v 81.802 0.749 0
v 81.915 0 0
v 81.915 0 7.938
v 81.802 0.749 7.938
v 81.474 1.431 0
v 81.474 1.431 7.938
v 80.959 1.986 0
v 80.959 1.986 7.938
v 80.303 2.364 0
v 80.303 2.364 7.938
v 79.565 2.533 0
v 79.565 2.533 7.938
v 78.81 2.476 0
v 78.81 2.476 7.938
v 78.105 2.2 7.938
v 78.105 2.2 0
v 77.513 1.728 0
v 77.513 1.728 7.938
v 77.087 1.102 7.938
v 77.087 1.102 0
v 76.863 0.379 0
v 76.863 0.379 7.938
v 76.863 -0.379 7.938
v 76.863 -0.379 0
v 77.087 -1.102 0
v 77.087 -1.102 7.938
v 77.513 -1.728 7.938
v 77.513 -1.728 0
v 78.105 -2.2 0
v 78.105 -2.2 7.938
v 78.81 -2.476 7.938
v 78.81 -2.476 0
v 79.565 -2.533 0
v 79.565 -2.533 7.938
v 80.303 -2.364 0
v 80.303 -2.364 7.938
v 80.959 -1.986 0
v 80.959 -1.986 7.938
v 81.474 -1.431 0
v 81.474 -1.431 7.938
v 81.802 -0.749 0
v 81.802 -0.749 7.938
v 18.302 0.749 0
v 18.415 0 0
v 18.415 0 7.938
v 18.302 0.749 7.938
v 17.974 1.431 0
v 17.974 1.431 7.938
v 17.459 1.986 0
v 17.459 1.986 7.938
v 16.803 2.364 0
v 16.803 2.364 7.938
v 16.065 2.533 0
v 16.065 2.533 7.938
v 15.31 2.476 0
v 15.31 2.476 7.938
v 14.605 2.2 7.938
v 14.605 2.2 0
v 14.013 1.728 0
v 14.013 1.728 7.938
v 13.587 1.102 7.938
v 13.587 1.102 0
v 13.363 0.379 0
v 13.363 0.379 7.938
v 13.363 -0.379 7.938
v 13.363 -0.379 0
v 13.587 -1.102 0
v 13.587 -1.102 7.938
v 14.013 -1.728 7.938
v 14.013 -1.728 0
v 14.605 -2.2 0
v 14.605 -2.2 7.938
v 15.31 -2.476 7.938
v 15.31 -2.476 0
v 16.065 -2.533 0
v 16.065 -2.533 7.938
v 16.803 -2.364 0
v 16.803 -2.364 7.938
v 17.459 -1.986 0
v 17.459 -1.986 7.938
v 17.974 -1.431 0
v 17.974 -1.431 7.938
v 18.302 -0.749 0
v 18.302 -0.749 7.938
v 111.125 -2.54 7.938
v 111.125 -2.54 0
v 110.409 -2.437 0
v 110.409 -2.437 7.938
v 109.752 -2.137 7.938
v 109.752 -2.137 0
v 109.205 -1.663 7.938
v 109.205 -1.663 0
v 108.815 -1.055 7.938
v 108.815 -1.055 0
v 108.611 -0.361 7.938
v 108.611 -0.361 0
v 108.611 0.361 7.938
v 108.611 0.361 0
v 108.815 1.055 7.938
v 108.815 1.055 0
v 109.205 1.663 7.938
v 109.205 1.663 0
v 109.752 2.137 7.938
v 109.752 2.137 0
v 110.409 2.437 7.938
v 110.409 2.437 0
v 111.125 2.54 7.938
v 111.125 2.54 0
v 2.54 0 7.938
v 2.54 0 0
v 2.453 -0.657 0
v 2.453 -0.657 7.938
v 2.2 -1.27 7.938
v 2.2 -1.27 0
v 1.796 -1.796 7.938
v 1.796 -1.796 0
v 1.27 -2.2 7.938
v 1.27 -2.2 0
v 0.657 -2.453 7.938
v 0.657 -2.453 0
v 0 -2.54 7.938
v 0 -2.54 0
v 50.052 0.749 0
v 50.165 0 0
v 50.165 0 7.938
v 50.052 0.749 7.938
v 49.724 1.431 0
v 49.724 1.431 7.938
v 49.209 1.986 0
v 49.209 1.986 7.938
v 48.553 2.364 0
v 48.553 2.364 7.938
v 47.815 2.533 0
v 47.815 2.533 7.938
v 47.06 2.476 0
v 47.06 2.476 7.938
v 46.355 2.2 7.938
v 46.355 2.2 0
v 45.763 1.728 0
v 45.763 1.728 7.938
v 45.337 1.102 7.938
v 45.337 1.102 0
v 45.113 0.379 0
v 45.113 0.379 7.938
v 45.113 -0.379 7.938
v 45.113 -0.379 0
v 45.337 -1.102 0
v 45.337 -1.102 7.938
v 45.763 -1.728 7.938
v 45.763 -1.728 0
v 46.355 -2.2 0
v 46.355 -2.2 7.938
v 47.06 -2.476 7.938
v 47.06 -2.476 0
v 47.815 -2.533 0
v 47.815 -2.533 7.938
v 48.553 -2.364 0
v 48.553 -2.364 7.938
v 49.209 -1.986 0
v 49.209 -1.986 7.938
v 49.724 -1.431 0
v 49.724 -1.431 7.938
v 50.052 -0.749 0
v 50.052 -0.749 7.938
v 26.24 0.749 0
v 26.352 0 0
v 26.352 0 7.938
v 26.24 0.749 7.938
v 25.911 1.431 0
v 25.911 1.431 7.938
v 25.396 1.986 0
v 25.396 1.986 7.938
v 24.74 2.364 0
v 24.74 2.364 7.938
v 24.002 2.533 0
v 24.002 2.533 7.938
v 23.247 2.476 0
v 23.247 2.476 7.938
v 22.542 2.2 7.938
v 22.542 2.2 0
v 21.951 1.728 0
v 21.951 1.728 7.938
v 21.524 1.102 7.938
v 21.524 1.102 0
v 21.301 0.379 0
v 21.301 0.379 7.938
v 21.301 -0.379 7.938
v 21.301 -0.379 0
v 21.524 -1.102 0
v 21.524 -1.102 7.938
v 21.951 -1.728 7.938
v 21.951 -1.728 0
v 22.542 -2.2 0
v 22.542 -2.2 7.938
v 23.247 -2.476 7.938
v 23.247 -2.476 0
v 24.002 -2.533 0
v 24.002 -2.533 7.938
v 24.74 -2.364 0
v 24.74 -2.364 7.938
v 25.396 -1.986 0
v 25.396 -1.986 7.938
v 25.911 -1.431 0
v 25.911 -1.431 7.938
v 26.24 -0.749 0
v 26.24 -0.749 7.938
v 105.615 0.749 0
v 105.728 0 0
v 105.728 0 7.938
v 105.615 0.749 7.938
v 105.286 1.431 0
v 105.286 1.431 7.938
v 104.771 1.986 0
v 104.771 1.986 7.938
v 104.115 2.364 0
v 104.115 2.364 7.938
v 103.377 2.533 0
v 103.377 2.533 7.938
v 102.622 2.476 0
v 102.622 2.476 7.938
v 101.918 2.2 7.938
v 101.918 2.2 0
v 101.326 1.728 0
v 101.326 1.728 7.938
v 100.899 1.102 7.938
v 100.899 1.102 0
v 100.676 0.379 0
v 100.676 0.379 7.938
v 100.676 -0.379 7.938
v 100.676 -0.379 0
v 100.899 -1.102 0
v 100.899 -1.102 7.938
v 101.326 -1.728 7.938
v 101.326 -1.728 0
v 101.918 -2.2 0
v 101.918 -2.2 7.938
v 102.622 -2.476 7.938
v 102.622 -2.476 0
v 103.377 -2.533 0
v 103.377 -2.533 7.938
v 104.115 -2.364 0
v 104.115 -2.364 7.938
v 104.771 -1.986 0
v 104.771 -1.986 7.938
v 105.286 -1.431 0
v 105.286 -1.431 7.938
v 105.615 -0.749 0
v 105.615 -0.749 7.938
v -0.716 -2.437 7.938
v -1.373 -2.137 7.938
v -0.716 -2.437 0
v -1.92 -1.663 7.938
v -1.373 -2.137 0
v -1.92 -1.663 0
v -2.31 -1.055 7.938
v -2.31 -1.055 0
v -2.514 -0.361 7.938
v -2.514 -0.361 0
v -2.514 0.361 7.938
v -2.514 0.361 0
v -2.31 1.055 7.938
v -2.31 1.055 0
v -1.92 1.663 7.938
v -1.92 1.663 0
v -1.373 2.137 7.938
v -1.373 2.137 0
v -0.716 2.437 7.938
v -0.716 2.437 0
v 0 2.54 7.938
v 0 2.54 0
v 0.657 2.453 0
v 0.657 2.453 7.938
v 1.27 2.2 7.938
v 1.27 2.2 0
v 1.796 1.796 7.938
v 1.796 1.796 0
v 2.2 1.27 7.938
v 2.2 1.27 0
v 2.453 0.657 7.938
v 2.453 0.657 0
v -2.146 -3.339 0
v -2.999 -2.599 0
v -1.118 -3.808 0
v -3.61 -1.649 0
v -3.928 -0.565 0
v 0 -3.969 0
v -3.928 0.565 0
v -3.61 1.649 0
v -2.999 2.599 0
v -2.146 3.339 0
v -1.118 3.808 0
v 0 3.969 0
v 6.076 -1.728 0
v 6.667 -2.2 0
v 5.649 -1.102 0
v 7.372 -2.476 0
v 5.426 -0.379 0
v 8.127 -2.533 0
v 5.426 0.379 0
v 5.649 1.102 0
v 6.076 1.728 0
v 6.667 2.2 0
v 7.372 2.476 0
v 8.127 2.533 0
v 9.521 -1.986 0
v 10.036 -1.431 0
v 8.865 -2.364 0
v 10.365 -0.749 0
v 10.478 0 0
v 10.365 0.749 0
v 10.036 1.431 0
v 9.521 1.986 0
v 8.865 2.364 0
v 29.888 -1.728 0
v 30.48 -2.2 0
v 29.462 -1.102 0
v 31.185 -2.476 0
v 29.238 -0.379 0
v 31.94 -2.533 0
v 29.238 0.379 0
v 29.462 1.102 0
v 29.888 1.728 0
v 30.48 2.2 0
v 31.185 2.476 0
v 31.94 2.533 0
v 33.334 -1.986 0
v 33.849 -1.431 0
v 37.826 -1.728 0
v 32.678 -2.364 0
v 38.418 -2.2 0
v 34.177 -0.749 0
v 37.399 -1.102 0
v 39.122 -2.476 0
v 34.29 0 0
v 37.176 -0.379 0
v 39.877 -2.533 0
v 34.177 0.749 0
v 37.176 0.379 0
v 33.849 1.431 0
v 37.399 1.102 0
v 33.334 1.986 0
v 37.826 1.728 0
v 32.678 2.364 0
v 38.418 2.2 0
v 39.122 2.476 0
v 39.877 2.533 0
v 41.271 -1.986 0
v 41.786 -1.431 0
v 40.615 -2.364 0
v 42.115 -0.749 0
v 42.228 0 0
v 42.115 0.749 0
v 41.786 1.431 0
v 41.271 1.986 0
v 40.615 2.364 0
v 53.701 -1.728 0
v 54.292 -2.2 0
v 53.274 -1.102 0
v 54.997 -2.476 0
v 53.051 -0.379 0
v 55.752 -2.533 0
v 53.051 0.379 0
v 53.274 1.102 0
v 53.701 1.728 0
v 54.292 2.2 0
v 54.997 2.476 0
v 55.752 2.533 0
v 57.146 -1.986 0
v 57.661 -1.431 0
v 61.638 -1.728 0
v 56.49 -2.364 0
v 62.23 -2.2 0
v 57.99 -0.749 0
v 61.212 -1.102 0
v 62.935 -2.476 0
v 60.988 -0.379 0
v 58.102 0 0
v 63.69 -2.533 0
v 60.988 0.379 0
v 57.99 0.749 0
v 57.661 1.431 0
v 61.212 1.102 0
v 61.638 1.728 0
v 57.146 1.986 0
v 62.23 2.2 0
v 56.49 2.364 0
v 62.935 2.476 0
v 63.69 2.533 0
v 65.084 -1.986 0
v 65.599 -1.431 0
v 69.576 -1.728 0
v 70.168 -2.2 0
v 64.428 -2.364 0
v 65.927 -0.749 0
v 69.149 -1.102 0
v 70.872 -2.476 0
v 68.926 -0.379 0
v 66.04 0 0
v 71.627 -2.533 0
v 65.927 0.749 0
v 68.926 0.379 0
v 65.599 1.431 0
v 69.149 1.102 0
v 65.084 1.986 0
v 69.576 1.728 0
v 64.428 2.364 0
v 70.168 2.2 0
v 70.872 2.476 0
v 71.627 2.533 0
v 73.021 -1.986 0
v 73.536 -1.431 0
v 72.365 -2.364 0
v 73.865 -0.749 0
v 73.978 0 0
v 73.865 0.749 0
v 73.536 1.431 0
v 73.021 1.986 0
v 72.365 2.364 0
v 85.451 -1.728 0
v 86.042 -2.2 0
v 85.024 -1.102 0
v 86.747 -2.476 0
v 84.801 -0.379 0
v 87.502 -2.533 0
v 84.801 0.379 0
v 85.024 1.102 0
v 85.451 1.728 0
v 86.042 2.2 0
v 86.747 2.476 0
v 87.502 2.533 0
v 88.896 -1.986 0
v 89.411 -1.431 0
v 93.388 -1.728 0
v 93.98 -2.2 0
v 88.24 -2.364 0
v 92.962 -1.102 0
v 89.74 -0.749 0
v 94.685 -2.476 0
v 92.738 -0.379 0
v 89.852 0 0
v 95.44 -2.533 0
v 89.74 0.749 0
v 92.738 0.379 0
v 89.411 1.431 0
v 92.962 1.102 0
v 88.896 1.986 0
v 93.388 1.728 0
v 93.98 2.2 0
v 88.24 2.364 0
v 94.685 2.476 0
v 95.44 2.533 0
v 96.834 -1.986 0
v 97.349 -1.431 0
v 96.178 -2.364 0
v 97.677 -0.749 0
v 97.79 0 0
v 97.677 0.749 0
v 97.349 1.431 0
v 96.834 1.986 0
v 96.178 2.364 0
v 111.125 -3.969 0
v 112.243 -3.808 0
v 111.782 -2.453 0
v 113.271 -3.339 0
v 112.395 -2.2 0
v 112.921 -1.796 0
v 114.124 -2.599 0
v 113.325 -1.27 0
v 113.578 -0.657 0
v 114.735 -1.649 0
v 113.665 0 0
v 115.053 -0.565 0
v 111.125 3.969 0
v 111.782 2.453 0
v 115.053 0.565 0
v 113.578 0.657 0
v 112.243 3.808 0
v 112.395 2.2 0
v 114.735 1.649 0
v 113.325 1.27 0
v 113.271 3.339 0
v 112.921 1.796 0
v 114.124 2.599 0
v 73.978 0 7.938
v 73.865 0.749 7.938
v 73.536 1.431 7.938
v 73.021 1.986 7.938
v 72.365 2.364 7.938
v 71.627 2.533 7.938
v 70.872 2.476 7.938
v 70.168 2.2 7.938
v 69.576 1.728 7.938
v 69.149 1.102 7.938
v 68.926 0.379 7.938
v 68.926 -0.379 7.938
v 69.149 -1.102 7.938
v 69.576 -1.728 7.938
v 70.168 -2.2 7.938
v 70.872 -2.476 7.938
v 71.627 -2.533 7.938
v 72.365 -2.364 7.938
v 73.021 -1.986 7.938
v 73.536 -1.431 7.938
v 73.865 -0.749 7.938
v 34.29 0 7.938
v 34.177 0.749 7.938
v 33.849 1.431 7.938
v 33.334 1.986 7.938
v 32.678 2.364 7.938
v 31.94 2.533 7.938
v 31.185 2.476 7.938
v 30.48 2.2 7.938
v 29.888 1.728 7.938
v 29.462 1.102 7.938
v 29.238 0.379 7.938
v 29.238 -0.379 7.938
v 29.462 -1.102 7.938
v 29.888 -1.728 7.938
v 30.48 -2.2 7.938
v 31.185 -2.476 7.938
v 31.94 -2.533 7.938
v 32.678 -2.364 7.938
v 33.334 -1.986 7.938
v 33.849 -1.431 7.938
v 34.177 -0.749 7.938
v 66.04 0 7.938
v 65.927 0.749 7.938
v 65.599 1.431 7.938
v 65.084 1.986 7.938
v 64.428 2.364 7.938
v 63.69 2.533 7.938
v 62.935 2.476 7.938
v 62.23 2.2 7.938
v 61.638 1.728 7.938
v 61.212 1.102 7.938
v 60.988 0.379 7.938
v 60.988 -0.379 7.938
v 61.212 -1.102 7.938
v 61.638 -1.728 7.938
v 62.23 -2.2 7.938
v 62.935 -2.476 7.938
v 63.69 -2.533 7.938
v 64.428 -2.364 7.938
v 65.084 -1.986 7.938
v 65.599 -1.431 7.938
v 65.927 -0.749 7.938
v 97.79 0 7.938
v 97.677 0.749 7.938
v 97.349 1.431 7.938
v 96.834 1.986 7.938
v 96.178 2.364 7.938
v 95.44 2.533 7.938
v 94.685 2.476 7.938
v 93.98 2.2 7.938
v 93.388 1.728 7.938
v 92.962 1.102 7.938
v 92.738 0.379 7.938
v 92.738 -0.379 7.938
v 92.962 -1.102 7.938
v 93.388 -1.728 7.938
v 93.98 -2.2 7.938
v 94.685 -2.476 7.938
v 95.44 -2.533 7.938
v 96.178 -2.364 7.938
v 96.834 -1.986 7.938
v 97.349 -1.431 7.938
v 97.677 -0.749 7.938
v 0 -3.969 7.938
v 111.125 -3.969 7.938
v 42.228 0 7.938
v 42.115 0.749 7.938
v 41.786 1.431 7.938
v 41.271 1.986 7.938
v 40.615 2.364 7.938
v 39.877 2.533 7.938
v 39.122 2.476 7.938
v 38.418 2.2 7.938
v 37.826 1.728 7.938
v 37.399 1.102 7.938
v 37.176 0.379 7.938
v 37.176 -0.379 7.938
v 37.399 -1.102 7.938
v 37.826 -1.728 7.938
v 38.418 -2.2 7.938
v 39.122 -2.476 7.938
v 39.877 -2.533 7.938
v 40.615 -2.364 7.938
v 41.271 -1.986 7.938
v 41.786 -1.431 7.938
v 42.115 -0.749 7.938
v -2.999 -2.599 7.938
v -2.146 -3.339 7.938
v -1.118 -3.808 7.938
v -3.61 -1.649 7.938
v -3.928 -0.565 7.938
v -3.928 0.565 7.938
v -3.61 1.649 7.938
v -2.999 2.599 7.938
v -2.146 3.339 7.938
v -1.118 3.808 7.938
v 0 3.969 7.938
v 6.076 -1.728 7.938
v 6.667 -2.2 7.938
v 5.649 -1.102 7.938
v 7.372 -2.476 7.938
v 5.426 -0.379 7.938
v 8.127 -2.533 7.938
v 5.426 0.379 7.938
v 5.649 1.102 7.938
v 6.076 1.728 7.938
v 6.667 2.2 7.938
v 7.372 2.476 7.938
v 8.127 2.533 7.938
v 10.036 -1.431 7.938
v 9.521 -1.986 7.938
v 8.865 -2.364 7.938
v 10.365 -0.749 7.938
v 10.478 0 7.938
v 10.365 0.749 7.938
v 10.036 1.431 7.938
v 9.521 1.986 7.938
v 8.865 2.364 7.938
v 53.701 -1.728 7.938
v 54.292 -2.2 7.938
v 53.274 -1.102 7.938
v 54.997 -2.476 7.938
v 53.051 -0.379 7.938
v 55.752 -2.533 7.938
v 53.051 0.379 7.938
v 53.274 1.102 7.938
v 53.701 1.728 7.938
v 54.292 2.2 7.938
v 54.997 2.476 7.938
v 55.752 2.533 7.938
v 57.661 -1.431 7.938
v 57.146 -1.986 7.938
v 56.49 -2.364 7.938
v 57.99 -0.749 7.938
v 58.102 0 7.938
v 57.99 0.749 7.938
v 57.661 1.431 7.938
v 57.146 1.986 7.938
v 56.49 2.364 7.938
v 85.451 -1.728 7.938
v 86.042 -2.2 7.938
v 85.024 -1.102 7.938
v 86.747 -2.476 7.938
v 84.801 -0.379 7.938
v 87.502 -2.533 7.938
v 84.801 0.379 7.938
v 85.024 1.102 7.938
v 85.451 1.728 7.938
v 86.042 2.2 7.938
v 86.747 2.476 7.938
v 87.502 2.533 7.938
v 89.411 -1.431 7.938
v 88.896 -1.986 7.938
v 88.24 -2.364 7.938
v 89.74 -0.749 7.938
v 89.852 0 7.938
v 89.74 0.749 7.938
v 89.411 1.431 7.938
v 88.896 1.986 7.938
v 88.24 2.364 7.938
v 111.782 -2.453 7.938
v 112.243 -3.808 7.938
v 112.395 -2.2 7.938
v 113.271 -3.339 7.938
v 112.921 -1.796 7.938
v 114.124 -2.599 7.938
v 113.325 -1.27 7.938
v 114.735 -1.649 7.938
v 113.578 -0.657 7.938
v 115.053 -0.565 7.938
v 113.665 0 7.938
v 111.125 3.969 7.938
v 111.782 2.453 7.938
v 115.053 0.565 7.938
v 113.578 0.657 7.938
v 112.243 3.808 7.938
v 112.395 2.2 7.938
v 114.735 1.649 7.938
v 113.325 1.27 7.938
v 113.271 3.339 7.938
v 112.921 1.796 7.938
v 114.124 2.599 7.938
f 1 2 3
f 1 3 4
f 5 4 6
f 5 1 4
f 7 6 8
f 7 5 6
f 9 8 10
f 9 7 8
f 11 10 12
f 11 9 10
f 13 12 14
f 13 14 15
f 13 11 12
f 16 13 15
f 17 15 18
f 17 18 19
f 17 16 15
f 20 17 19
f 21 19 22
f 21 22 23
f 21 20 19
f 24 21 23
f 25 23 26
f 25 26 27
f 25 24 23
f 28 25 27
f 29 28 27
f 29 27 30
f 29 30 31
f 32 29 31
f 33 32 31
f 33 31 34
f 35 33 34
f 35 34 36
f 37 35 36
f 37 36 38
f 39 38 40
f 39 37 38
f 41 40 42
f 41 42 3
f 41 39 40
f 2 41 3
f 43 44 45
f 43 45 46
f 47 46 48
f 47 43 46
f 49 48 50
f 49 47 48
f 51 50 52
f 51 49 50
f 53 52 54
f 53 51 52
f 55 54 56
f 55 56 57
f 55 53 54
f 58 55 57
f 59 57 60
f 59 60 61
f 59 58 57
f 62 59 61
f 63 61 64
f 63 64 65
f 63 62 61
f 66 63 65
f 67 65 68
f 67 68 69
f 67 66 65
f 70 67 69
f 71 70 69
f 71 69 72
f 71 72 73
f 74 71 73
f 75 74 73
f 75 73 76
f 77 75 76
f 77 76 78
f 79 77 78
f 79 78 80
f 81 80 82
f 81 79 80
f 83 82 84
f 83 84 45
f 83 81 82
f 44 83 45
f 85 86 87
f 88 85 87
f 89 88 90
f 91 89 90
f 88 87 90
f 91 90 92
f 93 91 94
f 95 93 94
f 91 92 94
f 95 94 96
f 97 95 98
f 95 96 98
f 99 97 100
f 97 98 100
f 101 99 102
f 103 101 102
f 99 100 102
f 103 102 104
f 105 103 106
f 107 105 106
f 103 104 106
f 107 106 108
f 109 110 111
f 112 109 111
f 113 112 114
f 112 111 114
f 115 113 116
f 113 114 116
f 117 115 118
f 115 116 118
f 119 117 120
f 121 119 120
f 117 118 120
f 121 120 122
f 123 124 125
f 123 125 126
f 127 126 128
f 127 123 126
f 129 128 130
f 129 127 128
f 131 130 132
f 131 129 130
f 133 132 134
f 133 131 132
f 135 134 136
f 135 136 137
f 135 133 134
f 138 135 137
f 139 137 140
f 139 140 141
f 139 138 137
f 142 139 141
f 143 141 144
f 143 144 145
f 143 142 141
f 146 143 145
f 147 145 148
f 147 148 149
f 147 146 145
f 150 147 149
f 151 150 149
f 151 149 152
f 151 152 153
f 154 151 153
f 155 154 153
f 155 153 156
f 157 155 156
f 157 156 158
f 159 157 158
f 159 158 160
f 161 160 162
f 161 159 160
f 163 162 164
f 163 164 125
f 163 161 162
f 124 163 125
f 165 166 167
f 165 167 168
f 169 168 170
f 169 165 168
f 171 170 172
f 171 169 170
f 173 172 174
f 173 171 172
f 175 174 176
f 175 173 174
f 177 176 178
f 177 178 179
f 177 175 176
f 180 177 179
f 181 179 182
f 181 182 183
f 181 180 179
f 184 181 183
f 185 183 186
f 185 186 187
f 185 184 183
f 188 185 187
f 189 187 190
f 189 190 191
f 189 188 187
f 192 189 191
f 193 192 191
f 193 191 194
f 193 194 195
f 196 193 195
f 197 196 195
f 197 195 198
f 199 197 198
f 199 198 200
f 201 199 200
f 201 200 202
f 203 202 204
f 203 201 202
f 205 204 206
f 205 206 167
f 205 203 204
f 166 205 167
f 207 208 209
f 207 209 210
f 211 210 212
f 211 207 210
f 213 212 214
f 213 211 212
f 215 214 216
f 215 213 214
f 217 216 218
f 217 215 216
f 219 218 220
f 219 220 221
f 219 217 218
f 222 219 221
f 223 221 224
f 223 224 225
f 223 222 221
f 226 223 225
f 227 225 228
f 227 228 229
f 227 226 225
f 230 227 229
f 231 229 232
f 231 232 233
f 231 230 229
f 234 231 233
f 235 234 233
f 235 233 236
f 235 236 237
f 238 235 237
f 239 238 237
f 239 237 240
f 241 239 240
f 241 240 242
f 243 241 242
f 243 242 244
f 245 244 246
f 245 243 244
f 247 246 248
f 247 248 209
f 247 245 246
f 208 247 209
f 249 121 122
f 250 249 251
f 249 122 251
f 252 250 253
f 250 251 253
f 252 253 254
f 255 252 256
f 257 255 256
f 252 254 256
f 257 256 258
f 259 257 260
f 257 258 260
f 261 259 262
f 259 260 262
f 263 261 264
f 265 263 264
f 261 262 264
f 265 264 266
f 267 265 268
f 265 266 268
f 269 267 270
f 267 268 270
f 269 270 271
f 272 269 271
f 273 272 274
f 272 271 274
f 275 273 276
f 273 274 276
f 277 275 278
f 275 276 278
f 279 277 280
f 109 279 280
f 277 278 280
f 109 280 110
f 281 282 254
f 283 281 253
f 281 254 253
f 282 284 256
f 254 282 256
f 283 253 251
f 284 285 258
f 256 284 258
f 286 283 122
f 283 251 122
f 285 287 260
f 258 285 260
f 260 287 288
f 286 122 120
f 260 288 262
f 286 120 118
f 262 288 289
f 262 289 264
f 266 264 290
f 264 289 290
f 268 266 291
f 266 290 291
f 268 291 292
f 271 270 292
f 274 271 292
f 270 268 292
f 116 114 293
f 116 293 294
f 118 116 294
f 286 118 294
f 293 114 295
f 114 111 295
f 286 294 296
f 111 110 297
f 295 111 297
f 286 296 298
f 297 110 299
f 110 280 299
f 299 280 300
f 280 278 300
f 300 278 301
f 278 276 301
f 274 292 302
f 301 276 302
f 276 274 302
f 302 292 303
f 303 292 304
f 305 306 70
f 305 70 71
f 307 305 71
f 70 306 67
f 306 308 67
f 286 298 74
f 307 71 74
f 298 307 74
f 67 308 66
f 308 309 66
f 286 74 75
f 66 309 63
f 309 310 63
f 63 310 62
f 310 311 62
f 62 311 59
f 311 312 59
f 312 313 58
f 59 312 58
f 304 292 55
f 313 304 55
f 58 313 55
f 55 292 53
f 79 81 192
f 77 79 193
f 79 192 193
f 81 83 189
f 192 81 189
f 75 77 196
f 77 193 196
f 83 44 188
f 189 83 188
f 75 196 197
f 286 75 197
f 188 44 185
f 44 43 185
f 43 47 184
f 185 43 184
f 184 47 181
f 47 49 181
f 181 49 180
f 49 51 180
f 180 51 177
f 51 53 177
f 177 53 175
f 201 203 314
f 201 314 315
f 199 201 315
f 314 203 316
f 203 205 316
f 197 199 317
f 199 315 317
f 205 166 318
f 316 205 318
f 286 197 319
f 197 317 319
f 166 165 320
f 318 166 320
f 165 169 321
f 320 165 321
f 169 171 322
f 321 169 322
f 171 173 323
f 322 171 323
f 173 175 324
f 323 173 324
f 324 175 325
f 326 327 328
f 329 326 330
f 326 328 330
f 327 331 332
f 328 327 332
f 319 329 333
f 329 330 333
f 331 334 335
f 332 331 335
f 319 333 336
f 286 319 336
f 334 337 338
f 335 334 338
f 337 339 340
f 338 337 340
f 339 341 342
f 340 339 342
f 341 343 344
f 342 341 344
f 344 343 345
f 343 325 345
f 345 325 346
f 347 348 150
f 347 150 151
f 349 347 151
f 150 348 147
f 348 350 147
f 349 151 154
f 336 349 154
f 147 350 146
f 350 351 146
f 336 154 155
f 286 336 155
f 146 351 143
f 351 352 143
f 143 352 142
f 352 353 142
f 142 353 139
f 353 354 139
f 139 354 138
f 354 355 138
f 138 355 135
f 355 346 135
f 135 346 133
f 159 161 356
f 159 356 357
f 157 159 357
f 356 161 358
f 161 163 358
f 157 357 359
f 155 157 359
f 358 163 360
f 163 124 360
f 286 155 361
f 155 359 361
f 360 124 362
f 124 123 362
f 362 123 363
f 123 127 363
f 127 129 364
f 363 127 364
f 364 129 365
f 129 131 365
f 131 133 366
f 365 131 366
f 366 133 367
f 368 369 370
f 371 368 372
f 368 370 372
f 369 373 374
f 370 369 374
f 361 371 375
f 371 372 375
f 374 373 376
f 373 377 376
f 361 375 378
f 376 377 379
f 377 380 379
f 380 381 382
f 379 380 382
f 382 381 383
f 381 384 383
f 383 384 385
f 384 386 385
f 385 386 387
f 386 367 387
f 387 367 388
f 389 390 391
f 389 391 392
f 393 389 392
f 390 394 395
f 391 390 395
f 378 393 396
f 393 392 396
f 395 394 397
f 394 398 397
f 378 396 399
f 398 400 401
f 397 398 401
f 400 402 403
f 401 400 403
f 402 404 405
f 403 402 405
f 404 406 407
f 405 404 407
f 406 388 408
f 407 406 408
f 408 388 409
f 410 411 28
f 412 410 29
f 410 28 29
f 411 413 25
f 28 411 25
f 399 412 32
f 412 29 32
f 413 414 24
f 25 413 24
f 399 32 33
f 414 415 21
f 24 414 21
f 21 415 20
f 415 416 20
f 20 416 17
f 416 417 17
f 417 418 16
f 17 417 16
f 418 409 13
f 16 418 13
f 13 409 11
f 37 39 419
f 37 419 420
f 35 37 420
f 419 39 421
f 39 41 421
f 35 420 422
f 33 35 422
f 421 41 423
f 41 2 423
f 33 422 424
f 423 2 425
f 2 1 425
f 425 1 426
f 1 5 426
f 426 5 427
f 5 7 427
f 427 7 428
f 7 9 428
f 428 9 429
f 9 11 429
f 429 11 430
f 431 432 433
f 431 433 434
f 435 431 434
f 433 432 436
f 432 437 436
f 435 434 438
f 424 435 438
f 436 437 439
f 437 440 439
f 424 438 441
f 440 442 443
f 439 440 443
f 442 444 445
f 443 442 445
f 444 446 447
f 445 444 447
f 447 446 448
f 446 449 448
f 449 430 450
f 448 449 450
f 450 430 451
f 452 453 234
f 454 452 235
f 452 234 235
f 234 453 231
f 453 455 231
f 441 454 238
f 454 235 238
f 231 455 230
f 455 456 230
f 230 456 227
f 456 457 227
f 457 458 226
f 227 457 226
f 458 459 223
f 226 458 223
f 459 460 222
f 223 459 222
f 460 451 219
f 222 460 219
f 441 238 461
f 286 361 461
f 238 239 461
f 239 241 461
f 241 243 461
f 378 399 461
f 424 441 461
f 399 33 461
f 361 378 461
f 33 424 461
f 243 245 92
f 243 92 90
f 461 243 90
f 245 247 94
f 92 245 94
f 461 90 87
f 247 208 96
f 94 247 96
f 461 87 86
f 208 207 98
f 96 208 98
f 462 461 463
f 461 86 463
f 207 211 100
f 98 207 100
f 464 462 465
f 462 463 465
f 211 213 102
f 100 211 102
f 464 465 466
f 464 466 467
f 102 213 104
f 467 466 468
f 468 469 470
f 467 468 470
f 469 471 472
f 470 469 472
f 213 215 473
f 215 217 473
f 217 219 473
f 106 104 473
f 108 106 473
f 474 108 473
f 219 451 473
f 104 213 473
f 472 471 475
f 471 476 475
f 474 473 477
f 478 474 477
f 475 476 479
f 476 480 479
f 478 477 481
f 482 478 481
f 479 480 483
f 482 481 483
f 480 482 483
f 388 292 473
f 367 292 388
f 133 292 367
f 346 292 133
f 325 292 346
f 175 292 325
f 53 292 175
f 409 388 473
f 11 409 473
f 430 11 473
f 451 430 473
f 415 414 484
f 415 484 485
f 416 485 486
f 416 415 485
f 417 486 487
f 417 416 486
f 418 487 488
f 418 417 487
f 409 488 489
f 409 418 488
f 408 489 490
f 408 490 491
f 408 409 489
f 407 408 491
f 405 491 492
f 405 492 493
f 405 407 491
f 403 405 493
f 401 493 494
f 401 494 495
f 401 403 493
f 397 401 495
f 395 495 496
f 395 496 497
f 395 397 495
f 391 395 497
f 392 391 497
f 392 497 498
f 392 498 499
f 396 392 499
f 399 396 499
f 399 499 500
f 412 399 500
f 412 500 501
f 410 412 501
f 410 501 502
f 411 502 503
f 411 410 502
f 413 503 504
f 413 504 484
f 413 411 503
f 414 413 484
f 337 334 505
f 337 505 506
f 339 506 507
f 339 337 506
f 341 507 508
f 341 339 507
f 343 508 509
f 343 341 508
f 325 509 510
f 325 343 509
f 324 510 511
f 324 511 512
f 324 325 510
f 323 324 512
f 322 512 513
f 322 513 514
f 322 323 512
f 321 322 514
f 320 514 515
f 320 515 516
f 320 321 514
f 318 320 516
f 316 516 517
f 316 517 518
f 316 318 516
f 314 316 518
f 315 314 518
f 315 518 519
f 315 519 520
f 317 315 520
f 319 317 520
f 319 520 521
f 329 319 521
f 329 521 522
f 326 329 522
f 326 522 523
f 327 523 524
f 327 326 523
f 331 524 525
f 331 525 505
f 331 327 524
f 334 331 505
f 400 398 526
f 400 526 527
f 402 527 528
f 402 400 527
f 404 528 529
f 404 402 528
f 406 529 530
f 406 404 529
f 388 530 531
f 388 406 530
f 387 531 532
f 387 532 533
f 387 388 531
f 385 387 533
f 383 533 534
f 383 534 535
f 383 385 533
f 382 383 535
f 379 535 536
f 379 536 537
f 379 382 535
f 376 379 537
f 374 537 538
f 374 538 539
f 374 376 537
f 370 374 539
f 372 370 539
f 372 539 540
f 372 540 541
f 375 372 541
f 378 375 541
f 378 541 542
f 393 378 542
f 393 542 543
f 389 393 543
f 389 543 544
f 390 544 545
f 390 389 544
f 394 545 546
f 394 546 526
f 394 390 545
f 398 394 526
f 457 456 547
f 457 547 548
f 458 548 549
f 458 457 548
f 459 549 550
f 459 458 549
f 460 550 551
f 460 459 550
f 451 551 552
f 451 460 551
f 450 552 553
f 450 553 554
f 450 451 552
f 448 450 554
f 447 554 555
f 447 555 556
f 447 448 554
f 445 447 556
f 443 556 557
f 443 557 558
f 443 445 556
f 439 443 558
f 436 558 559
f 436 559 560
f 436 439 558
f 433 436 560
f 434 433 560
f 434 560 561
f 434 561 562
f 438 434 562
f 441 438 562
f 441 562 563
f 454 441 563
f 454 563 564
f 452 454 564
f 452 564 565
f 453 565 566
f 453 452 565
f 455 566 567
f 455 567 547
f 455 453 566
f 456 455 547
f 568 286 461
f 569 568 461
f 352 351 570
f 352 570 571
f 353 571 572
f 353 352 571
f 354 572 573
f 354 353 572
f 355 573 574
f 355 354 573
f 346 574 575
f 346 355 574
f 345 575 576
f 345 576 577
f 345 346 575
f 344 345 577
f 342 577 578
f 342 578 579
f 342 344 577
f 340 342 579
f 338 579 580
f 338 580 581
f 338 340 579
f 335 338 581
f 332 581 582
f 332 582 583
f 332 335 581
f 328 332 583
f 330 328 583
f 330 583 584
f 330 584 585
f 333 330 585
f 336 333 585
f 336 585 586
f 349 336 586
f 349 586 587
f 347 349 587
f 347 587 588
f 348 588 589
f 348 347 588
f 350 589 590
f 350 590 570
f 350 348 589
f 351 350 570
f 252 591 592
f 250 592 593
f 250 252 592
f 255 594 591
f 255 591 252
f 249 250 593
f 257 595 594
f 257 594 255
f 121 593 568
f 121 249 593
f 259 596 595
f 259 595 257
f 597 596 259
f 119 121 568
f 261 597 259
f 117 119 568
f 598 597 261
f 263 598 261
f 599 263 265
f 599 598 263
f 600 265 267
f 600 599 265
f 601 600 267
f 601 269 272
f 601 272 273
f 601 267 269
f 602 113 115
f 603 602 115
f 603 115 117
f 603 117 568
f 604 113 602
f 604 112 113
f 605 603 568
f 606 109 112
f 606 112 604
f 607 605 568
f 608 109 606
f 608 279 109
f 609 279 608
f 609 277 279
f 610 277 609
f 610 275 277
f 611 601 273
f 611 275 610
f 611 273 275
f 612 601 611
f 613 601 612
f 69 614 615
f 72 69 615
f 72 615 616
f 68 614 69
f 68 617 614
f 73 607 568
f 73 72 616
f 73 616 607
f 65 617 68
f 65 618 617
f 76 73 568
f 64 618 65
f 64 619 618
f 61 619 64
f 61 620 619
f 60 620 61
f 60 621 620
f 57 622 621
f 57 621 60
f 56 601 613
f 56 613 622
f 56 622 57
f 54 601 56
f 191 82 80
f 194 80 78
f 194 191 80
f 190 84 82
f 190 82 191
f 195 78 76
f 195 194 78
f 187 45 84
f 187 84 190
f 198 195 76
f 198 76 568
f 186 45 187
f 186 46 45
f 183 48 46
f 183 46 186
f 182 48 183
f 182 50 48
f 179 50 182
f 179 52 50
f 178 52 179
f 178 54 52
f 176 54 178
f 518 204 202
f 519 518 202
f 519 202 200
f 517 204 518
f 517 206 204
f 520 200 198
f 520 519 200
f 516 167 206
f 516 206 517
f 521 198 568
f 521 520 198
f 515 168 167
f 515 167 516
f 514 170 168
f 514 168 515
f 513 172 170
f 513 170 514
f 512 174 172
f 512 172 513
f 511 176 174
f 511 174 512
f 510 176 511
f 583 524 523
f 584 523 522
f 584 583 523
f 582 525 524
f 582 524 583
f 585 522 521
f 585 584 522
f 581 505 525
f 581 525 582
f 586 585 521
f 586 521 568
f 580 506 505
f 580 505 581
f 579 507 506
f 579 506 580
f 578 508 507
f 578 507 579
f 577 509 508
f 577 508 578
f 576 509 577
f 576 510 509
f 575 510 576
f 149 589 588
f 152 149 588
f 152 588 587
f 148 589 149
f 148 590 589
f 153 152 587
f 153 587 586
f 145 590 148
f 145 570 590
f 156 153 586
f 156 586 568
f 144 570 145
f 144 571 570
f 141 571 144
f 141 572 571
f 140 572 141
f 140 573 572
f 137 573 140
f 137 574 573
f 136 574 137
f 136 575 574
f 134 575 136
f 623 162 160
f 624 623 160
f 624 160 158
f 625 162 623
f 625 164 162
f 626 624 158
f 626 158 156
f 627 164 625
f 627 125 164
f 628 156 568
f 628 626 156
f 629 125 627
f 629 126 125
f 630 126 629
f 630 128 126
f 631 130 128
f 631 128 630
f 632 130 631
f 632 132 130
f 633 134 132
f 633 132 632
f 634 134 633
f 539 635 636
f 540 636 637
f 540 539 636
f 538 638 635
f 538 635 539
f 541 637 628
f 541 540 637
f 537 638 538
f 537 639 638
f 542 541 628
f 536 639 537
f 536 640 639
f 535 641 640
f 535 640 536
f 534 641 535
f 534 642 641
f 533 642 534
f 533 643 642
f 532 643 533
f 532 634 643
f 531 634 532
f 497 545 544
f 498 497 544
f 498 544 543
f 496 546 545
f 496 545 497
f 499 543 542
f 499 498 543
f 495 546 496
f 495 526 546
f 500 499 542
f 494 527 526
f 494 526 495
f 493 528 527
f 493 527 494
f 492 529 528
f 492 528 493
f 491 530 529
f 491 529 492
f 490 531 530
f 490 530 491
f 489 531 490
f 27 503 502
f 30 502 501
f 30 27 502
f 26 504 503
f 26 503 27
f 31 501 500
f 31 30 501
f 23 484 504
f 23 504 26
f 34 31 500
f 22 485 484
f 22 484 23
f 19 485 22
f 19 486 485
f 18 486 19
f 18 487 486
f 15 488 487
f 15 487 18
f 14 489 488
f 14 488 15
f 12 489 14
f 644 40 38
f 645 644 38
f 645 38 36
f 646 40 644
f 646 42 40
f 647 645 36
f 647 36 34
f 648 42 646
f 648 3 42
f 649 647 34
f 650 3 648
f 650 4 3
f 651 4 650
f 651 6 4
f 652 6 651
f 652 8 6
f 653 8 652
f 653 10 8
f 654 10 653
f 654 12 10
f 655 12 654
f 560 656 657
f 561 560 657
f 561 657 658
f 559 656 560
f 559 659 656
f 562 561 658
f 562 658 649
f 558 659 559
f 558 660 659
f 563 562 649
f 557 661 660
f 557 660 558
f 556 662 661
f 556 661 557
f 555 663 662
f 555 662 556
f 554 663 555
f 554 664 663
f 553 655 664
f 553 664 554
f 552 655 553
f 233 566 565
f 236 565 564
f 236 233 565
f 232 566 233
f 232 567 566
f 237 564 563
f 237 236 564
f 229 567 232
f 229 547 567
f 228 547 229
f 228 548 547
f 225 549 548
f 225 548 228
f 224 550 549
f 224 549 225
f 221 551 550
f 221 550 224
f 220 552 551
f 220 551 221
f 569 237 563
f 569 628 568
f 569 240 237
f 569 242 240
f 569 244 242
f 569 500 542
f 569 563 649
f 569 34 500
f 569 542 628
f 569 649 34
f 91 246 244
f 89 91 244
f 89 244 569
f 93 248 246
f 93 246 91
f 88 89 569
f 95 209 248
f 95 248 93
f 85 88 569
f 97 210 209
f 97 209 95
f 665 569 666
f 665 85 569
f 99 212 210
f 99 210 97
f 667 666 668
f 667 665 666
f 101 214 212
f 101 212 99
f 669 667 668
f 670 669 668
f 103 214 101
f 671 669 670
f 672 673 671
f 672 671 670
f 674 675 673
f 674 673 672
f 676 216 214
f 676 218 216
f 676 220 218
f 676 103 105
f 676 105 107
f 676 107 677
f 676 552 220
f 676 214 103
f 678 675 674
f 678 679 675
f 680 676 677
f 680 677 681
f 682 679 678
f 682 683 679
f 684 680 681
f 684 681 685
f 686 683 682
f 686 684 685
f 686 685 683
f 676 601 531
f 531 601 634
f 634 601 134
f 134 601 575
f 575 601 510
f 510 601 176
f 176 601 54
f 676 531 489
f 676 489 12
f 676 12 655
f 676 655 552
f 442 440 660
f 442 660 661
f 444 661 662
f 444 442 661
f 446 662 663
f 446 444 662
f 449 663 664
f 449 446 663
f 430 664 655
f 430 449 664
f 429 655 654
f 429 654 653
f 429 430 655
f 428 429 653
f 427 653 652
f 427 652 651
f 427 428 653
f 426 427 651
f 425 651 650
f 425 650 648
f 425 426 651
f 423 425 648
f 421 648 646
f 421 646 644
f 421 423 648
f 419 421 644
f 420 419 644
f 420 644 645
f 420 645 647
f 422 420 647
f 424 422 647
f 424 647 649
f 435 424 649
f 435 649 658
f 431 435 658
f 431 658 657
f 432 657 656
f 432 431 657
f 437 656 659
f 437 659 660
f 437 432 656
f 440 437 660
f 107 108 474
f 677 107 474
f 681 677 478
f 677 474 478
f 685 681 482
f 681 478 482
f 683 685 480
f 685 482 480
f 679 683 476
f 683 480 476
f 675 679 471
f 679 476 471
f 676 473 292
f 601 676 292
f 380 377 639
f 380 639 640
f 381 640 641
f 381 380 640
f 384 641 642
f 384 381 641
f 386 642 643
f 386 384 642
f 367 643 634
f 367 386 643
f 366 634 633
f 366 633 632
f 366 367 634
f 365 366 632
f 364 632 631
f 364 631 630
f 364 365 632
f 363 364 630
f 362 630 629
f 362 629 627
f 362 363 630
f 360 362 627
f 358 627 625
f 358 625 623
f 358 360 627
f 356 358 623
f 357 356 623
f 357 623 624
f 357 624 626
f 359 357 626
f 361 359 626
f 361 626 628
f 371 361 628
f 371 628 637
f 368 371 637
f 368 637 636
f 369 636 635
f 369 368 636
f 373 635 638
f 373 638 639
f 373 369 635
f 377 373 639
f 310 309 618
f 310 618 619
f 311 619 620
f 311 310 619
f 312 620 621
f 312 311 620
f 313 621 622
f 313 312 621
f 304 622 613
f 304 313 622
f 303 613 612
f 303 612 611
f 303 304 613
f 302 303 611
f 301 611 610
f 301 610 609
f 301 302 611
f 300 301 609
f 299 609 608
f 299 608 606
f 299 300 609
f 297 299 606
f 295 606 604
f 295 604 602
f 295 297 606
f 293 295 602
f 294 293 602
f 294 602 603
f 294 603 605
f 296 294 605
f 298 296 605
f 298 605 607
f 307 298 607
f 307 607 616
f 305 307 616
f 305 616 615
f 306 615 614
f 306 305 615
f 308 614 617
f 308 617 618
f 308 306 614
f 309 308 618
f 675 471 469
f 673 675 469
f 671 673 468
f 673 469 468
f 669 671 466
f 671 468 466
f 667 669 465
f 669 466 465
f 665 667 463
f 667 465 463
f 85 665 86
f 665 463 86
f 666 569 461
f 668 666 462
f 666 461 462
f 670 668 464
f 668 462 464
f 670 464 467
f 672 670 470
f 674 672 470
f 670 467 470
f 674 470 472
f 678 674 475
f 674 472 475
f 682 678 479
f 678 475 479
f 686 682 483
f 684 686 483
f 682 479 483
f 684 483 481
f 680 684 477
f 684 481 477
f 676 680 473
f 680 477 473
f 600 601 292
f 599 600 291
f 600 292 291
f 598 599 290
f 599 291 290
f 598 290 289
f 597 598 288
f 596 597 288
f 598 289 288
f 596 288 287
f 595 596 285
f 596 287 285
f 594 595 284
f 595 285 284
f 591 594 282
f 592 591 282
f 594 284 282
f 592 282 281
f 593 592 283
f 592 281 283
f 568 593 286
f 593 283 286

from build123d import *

# Parameters (mm, degrees)
F0_R     = 2.54
F1_DEPTH = 7.9375


with BuildPart() as f1:
    # F0 (on Top) → F1 (new body)
    with BuildSketch(Plane.XY):
        with BuildLine():
            Line((111.125, 3.96875), (0, 3.96875))
            Line((0, 3.96875), (0, 2.54))
            ThreePointArc((0, 2.54), (1.796051, 1.796051), (2.54, 0))
            ThreePointArc((2.54, 0), (1.796051, -1.796051), (0, -2.54))
            Line((0, -2.54), (0, -3.96875))
            Line((0, -3.96875), (111.125, -3.96875))
            Line((111.125, -3.96875), (111.125, -2.54))
            ThreePointArc((111.125, -2.54), (108.585, 0), (111.125, 2.54))
            Line((111.125, 2.54), (111.125, 3.96875))
        make_face()
        with Locations((7.9375, 0)):
            Circle(F0_R, mode=Mode.SUBTRACT)
        with Locations((15.875, 0)):
            Circle(F0_R, mode=Mode.SUBTRACT)
        with Locations((23.8125, 0)):
            Circle(F0_R, mode=Mode.SUBTRACT)
        with Locations((31.75, 0)):
            Circle(F0_R, mode=Mode.SUBTRACT)
        with Locations((39.6875, 0)):
            Circle(F0_R, mode=Mode.SUBTRACT)
        with Locations((47.625, 0)):
            Circle(F0_R, mode=Mode.SUBTRACT)
        with Locations((55.5625, 0)):
            Circle(F0_R, mode=Mode.SUBTRACT)
        with Locations((63.5, 0)):
            Circle(F0_R, mode=Mode.SUBTRACT)
        with Locations((71.4375, 0)):
            Circle(F0_R, mode=Mode.SUBTRACT)
        with Locations((79.375, 0)):
            Circle(F0_R, mode=Mode.SUBTRACT)
        with Locations((87.3125, 0)):
            Circle(F0_R, mode=Mode.SUBTRACT)
        with Locations((95.25, 0)):
            Circle(F0_R, mode=Mode.SUBTRACT)
        with Locations((103.1875, 0)):
            Circle(F0_R, mode=Mode.SUBTRACT)
        with BuildLine():
            Line((0, 2.54), (0, 3.96875))
            ThreePointArc((0, 3.96875), (-3.96875, 0), (0, -3.96875))
            Line((0, -3.96875), (0, -2.54))
            ThreePointArc((0, -2.54), (-2.54, 0), (0, 2.54))
        make_face()
        with BuildLine():
            ThreePointArc((111.125, -3.96875), (115.09375, 0), (111.125, 3.96875))
            Line((111.125, 3.96875), (111.125, 2.54))
            ThreePointArc((111.125, 2.54), (112.921051, 1.796051), (113.665, 0))
            ThreePointArc((113.665, 0), (112.921051, -1.796051), (111.125, -2.54))
            Line((111.125, -2.54), (111.125, -3.96875))
        make_face()
    extrude(amount=F1_DEPTH)


solid = f1.part
